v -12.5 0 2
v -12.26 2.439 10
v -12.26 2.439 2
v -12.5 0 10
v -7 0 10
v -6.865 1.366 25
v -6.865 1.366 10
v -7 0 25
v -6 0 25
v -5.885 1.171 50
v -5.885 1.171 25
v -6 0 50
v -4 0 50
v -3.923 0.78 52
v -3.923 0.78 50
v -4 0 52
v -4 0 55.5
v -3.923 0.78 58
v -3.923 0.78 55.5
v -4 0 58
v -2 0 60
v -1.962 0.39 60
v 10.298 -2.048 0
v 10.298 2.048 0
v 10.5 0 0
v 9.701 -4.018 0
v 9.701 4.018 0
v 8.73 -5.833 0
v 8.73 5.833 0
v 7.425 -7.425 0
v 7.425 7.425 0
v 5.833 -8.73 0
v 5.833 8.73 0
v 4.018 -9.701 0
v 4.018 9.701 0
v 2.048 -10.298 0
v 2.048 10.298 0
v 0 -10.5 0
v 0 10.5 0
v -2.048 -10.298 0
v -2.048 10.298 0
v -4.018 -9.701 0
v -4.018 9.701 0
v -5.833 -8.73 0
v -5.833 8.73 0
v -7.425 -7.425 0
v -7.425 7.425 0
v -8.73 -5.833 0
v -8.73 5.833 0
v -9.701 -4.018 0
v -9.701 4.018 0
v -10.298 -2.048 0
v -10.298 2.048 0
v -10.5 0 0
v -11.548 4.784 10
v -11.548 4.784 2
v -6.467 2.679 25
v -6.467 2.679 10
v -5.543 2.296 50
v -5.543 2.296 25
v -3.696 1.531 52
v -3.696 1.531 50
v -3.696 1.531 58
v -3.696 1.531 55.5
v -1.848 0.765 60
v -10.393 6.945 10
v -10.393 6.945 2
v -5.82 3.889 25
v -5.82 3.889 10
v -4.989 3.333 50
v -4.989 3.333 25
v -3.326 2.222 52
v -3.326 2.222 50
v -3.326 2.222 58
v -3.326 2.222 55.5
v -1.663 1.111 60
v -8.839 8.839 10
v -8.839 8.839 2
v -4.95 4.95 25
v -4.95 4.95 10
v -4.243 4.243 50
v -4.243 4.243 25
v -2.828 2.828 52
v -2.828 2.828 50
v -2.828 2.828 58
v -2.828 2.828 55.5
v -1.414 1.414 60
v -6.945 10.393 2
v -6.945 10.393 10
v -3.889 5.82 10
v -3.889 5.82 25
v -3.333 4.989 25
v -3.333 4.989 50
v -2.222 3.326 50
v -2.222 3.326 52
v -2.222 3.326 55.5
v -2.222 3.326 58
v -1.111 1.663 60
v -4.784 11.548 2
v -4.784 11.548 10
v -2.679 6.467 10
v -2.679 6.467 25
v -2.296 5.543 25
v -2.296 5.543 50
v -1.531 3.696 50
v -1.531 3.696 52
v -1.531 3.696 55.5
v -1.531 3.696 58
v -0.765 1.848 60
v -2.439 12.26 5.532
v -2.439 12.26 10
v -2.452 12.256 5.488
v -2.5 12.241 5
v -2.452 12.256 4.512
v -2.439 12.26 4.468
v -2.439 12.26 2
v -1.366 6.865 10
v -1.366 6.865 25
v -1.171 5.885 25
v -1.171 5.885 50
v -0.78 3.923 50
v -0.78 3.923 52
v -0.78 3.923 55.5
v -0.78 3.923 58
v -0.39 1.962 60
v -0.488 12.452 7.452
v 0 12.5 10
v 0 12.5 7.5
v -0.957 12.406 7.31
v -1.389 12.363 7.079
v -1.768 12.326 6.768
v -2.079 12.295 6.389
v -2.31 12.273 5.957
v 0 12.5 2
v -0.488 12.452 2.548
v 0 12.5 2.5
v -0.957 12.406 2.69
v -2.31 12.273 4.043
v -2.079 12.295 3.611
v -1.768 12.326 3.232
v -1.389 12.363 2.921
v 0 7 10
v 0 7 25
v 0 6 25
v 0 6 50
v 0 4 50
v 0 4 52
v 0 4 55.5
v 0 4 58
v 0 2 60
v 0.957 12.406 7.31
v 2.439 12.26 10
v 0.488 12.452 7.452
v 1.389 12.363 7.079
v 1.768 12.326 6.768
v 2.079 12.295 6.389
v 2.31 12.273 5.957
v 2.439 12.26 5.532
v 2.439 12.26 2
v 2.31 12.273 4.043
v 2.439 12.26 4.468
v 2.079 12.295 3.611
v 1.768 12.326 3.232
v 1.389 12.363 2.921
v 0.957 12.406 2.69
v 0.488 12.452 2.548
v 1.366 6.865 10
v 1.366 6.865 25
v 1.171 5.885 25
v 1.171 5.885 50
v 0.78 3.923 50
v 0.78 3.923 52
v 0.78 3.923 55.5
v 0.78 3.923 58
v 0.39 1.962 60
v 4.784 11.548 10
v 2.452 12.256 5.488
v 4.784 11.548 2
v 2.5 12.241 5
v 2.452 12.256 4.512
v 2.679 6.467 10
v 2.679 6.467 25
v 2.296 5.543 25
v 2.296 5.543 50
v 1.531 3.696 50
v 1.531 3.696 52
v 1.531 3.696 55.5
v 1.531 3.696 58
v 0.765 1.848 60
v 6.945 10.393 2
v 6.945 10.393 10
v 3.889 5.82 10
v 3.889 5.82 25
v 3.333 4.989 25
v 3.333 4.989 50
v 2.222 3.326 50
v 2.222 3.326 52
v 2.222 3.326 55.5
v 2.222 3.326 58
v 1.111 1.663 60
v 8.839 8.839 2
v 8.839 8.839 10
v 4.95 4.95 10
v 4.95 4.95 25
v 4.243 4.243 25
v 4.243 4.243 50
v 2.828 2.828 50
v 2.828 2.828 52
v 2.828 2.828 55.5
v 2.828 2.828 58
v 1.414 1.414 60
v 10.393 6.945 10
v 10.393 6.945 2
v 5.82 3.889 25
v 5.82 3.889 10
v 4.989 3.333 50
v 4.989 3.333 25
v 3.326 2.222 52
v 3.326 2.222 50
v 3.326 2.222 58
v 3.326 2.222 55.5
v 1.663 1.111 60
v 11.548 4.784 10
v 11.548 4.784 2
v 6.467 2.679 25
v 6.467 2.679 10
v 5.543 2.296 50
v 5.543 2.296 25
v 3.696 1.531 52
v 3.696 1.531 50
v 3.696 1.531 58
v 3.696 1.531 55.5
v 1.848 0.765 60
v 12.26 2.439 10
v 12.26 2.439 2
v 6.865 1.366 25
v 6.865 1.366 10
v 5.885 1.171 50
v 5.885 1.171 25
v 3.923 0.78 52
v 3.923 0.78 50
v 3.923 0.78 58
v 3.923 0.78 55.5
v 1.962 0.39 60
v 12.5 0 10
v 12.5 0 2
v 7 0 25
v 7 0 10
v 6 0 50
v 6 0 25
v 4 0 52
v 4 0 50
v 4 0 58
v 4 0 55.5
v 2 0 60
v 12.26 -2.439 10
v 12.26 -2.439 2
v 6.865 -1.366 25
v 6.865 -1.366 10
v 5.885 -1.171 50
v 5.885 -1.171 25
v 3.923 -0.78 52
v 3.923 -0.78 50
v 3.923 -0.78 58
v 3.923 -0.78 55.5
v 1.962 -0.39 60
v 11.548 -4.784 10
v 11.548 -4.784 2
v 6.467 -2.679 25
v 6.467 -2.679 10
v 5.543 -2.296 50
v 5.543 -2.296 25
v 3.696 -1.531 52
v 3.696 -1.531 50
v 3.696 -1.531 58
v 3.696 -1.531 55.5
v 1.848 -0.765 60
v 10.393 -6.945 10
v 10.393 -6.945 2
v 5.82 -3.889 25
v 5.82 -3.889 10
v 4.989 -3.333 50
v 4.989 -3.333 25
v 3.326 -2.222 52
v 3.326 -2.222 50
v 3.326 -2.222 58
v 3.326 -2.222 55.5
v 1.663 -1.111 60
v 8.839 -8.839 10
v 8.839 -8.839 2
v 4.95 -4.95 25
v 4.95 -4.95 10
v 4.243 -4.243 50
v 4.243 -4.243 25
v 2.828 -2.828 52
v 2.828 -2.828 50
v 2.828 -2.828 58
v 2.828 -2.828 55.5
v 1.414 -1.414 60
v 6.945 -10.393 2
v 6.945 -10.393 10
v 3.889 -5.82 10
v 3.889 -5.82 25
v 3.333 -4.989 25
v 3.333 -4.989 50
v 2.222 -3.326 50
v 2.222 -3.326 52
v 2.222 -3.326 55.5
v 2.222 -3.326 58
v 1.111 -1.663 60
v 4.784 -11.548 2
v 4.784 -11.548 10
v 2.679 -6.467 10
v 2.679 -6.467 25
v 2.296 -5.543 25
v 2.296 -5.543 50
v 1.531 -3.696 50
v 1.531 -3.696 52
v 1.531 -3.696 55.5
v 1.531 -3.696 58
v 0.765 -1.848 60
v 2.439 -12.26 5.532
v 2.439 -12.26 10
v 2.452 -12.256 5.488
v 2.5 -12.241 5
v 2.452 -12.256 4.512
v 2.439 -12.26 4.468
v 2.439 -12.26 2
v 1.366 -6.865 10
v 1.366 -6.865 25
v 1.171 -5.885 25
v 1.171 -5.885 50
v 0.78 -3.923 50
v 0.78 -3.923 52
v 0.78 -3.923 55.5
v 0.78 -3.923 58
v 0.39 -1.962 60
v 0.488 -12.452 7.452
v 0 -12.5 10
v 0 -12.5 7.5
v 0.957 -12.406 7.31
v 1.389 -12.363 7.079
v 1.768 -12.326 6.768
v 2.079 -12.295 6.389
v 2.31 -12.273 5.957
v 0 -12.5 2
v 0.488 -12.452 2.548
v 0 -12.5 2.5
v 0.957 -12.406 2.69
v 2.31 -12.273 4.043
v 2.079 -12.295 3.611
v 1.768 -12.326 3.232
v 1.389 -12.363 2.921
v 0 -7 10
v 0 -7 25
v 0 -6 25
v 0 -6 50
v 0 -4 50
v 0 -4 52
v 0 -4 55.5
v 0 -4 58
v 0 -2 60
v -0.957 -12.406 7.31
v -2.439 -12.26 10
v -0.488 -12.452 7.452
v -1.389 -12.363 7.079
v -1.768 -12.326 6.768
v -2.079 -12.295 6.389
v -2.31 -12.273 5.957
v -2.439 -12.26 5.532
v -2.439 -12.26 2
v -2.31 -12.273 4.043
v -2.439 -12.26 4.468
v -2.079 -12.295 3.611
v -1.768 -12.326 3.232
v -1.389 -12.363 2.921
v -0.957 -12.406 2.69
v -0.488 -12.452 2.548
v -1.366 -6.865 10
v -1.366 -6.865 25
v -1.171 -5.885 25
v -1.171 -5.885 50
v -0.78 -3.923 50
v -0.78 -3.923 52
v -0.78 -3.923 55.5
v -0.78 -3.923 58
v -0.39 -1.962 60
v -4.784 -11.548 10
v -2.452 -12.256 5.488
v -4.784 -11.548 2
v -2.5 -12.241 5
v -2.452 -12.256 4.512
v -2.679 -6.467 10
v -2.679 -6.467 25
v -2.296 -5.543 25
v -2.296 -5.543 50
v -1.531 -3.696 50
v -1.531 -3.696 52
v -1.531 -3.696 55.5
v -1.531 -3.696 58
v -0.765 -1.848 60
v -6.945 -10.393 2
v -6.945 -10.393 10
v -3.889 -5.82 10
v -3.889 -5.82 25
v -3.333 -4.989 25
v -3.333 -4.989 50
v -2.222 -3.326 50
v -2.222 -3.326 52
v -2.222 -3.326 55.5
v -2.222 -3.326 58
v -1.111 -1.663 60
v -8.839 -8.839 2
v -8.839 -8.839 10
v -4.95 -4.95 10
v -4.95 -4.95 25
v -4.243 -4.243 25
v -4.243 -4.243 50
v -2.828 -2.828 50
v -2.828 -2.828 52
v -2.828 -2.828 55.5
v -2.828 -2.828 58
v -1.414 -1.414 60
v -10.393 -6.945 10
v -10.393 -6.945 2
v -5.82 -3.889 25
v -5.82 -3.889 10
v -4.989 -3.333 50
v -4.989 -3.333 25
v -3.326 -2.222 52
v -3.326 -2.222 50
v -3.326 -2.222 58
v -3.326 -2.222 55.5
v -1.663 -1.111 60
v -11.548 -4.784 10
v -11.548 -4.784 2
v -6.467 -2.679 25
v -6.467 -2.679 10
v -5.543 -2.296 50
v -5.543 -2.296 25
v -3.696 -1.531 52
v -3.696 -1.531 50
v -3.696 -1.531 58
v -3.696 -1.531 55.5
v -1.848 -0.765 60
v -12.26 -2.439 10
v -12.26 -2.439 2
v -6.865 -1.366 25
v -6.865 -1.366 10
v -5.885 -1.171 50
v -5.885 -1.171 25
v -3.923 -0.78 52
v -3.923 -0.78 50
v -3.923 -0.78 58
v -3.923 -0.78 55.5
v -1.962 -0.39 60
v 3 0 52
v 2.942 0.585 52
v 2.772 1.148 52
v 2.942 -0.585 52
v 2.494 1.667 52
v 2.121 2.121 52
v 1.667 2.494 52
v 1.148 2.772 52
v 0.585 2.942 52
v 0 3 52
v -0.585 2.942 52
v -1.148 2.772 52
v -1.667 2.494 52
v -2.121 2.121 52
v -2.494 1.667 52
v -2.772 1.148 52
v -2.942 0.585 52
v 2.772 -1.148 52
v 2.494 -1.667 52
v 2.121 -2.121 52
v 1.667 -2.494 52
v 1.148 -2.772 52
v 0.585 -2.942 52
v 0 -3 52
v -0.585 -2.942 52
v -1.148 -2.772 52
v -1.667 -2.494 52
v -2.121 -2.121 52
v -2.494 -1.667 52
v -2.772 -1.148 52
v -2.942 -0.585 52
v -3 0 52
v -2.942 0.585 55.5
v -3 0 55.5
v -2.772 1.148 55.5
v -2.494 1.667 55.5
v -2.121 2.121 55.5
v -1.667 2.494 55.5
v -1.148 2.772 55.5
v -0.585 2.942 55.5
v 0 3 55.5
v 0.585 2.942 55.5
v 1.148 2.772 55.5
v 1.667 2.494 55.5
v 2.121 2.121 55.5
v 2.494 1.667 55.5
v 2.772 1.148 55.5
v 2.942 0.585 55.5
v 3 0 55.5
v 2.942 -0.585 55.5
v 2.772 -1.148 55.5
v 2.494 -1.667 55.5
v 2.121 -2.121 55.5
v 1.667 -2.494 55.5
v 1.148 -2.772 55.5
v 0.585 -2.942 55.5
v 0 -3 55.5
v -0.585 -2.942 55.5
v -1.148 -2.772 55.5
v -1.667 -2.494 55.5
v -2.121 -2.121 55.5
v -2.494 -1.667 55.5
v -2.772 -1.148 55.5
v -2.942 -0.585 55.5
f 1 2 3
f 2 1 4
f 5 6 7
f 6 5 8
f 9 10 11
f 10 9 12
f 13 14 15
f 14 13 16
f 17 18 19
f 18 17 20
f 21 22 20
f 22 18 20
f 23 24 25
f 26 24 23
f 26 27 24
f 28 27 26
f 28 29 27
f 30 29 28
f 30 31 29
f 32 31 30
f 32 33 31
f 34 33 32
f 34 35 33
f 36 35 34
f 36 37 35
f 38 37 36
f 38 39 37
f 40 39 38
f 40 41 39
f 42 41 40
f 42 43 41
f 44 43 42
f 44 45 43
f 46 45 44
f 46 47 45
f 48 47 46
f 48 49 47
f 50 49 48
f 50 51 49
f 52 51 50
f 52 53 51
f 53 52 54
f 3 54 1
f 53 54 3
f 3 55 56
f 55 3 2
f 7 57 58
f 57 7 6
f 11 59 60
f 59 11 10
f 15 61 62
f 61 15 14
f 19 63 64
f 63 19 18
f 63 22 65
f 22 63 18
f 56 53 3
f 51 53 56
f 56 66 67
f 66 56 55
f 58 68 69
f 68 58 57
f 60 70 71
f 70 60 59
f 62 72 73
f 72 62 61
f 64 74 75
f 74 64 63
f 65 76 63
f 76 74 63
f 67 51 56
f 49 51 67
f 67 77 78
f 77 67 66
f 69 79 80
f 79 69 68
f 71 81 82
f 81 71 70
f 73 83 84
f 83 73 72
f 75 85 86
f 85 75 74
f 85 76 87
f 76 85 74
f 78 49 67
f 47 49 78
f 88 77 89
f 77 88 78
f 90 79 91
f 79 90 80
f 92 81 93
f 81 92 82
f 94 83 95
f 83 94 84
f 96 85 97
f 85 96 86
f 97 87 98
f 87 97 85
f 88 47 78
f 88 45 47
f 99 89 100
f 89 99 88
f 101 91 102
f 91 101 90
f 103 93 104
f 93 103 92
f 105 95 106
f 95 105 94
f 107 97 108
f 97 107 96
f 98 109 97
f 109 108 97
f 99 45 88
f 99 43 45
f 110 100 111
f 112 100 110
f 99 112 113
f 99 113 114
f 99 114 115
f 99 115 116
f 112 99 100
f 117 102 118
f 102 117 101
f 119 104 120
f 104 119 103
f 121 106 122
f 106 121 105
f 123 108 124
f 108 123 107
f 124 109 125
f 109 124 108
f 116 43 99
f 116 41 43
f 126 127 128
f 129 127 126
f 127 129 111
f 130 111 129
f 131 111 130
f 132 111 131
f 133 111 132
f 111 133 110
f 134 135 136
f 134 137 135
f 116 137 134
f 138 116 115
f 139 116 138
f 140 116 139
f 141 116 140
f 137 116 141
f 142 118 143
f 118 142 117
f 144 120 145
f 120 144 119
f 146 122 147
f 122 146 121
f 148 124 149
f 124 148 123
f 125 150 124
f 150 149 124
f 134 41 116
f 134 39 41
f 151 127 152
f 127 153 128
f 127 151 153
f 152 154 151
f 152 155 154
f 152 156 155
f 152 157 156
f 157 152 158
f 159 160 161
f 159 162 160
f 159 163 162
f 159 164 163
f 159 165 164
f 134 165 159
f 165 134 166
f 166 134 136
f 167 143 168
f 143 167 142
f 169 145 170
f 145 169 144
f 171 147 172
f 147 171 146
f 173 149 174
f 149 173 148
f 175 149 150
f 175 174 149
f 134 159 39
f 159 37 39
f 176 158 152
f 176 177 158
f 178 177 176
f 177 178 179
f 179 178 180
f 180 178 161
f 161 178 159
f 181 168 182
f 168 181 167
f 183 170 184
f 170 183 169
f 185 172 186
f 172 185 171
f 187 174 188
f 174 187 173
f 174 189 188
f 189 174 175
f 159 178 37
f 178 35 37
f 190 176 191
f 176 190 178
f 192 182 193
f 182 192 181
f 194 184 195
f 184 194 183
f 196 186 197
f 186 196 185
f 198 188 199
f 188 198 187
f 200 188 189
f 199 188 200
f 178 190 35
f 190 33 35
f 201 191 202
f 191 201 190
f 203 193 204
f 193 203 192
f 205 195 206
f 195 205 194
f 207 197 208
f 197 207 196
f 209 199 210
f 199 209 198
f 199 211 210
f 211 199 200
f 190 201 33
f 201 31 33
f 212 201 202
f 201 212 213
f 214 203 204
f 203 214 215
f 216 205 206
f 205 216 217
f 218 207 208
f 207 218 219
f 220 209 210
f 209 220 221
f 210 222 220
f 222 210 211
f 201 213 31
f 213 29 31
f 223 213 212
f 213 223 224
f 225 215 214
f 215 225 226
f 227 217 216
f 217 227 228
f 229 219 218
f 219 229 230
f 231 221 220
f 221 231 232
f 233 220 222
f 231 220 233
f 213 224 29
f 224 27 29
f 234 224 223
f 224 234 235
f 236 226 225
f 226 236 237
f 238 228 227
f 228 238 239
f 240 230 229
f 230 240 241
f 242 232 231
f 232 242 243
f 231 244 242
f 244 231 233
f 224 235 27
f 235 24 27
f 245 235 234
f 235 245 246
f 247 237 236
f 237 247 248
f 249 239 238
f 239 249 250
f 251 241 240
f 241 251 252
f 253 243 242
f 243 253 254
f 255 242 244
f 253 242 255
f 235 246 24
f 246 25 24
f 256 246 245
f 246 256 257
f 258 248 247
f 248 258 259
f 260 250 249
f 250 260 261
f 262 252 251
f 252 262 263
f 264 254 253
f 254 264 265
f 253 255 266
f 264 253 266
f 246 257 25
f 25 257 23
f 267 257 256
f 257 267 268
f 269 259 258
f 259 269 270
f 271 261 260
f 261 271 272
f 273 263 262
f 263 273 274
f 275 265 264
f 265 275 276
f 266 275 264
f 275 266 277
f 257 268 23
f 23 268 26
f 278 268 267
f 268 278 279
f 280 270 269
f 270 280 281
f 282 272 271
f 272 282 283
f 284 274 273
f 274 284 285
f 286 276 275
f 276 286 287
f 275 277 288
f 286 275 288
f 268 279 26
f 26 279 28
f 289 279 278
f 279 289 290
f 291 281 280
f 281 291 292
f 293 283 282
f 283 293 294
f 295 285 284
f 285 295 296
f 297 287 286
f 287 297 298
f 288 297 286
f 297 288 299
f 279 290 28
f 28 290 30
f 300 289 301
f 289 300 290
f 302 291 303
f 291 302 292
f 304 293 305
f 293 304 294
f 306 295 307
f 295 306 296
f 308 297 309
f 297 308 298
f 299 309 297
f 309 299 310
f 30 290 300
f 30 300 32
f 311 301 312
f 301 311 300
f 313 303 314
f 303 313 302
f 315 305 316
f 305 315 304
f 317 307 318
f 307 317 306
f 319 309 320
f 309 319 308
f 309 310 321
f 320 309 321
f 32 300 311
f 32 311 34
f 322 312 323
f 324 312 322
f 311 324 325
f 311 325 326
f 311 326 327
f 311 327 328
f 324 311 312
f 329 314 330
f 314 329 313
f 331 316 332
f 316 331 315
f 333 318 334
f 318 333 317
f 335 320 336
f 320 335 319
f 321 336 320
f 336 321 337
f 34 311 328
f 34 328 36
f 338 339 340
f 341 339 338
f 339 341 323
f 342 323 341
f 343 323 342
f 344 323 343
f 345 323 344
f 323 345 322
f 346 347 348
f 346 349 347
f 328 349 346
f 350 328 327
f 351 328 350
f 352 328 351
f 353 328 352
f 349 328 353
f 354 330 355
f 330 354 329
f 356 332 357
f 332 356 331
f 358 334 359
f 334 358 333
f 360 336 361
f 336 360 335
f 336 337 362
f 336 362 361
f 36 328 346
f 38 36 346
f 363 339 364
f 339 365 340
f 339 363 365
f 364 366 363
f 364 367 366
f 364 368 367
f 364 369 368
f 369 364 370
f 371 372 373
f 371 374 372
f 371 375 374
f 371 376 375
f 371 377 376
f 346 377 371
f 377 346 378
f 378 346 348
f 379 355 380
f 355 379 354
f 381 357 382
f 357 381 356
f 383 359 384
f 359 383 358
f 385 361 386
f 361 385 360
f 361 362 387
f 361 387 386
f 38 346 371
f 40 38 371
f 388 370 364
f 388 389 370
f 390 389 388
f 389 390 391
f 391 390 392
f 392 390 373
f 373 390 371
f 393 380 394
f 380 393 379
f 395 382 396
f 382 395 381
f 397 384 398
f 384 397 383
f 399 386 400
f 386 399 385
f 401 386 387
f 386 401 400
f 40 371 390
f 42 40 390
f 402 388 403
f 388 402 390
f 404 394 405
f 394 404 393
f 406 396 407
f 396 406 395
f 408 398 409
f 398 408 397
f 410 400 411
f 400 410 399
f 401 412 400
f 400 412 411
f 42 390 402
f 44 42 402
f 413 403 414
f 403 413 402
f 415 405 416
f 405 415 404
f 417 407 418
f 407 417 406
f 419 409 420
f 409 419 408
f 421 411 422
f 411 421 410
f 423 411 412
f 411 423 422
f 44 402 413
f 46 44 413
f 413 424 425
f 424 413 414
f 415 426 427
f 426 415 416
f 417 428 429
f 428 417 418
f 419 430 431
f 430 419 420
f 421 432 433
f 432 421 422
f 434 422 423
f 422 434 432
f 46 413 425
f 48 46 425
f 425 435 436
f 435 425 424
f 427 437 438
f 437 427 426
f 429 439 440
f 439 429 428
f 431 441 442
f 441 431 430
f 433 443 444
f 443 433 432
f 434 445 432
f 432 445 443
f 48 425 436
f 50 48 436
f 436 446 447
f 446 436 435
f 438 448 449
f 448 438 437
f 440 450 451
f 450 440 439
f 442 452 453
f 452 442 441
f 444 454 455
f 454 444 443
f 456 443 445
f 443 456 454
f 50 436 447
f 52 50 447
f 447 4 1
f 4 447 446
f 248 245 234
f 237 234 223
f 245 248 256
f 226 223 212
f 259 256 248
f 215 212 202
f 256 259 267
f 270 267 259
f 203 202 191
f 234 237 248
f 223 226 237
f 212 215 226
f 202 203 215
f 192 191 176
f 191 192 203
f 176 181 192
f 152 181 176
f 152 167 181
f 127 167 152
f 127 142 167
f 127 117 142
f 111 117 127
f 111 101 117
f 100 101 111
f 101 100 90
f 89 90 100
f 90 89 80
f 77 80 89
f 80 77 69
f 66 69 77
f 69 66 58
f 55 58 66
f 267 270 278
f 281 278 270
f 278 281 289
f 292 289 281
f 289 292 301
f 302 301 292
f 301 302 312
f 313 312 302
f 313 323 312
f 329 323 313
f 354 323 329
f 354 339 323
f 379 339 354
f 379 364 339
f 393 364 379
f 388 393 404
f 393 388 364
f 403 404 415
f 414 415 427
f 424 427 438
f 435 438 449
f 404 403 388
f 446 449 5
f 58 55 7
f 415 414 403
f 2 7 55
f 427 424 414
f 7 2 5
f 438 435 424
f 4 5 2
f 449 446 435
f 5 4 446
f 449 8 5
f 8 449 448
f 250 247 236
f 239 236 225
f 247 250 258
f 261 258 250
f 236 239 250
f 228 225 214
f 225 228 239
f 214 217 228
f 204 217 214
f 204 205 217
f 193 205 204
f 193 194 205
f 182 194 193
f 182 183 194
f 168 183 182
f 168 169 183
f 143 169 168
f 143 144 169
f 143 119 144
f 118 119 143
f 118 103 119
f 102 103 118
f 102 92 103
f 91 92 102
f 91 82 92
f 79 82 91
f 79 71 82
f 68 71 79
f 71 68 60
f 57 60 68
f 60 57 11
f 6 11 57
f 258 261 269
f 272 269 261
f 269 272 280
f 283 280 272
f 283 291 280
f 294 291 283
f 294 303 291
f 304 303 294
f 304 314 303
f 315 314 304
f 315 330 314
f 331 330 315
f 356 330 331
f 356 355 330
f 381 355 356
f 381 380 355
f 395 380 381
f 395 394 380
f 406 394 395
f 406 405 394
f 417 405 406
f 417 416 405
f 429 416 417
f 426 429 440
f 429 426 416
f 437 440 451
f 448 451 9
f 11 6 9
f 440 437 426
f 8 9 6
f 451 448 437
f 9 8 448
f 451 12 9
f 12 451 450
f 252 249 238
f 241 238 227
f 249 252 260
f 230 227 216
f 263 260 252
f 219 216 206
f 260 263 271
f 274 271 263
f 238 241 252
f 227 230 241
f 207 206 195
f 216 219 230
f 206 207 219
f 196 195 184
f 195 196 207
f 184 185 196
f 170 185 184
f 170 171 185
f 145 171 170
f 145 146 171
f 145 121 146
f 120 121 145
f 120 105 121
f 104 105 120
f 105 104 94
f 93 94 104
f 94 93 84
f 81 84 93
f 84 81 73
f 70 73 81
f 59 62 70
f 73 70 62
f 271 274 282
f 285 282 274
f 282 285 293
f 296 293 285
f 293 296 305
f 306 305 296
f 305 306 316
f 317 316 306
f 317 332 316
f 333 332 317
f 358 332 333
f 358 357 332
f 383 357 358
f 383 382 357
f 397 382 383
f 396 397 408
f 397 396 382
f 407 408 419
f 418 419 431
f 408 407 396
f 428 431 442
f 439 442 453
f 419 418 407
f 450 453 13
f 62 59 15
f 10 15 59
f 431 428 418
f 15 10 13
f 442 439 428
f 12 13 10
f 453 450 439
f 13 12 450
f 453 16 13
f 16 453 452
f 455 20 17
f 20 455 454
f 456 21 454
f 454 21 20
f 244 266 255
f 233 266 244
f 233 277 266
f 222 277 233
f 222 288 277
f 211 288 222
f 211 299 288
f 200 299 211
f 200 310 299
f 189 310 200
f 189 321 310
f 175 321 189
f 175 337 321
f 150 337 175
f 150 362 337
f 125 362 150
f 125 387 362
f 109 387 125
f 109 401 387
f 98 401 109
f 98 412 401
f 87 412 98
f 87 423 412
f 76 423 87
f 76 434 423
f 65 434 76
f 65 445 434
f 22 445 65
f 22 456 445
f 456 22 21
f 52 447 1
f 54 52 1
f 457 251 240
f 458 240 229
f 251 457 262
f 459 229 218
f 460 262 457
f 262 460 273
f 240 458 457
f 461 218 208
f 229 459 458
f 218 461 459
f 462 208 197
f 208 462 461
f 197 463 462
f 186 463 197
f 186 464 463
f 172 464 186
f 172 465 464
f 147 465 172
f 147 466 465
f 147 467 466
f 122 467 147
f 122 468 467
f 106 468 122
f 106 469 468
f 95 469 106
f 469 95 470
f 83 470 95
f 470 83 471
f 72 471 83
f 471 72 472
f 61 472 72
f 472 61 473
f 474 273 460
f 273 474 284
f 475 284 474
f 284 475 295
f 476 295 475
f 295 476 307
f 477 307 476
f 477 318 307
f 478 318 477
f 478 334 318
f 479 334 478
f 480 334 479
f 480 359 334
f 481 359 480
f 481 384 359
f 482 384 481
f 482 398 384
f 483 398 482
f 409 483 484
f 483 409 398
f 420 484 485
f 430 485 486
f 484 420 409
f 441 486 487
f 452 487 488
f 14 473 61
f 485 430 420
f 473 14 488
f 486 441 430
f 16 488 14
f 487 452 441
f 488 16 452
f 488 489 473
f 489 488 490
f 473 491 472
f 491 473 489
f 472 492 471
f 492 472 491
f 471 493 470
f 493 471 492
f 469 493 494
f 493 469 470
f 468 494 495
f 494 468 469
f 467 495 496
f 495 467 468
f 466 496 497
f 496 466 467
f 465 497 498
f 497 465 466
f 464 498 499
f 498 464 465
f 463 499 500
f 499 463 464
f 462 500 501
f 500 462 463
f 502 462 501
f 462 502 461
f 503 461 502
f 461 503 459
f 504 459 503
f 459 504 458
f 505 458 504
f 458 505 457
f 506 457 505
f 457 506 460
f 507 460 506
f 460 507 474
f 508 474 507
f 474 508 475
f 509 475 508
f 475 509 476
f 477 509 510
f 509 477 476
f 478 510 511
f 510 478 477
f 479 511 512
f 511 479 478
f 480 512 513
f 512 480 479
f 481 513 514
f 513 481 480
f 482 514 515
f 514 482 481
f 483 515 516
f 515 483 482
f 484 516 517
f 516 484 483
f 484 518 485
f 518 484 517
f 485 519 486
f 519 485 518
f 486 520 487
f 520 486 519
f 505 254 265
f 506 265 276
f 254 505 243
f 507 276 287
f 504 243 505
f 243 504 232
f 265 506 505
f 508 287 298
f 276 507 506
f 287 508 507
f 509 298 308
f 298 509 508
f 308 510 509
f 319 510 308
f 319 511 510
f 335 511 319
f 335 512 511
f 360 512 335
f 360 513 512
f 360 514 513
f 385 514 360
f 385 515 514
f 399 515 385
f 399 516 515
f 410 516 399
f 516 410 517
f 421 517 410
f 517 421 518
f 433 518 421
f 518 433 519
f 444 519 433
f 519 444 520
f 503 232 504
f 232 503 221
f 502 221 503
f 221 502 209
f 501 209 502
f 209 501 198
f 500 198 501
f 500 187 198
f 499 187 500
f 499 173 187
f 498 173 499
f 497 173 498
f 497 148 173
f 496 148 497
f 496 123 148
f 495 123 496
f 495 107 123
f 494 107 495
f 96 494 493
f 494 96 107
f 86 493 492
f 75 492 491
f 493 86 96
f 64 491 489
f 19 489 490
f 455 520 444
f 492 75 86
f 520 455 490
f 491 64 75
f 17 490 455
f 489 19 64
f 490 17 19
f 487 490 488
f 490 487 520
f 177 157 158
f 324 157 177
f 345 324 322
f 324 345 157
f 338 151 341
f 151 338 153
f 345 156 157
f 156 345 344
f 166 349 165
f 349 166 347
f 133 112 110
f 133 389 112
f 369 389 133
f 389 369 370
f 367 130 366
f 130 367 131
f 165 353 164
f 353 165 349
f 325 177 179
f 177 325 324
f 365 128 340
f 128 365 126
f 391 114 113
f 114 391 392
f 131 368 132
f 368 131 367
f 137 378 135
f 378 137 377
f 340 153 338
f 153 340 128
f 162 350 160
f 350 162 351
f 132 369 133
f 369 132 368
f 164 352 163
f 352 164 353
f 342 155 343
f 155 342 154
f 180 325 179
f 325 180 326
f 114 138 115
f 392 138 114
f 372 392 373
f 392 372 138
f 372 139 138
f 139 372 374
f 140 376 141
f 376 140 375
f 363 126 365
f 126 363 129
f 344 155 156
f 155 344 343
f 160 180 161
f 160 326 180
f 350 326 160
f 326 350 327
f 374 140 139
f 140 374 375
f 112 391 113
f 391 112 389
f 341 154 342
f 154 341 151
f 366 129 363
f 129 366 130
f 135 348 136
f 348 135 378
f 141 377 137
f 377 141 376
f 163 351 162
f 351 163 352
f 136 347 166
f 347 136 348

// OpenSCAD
$fn = 32;

// ----------------------------------------------------------------------
// Stepped shaft: diameters 25, 14, 12, 8 mm, 60 mm long
// ----------------------------------------------------------------------

// --- parameters (mm) ---
d1 = 25;                  // step 1 diameter
len1 = 10;                // step 1 length
d2 = 14;                  // step 2 diameter
len2 = 15;                // step 2 length
d3 = 12;                  // step 3 diameter
len3 = 25;                // step 3 length
d4 = 8;                   // step 4 diameter
len4 = 10;                // step 4 length
total = 60;               // overall length
chamfer = 2;              // end chamfer
groove_r = 4;             // groove radius
groove_z = 52;            // groove position from the end
groove_w = 3.5;           // groove width
groove_d = 1;             // groove depth
cross_d = 5;              // cross pin hole
cross_z = 5;              // cross hole position

/* closed turning profile: x is the radius, y is the length */
profile = [[0, 0], [12.5 - chamfer, 0], [12.5, chamfer], [12.5, 10], [7, 10], [7, 25], [6, 25], [6, 50], [4, 50], [4, 58], [2, 60], [0, 60]];

difference() {
  rotate_extrude() polygon(profile);
  /* circlip groove just behind the shoulder */
  rotate_extrude() translate([groove_r - groove_d, groove_z]) square([groove_d + 1, groove_w]);
  /* cross pin hole through the small step */
  translate([0, 0, cross_z]) rotate([90, 0, 0]) cylinder(h = d1 + 4, d = cross_d, center = true);
}
